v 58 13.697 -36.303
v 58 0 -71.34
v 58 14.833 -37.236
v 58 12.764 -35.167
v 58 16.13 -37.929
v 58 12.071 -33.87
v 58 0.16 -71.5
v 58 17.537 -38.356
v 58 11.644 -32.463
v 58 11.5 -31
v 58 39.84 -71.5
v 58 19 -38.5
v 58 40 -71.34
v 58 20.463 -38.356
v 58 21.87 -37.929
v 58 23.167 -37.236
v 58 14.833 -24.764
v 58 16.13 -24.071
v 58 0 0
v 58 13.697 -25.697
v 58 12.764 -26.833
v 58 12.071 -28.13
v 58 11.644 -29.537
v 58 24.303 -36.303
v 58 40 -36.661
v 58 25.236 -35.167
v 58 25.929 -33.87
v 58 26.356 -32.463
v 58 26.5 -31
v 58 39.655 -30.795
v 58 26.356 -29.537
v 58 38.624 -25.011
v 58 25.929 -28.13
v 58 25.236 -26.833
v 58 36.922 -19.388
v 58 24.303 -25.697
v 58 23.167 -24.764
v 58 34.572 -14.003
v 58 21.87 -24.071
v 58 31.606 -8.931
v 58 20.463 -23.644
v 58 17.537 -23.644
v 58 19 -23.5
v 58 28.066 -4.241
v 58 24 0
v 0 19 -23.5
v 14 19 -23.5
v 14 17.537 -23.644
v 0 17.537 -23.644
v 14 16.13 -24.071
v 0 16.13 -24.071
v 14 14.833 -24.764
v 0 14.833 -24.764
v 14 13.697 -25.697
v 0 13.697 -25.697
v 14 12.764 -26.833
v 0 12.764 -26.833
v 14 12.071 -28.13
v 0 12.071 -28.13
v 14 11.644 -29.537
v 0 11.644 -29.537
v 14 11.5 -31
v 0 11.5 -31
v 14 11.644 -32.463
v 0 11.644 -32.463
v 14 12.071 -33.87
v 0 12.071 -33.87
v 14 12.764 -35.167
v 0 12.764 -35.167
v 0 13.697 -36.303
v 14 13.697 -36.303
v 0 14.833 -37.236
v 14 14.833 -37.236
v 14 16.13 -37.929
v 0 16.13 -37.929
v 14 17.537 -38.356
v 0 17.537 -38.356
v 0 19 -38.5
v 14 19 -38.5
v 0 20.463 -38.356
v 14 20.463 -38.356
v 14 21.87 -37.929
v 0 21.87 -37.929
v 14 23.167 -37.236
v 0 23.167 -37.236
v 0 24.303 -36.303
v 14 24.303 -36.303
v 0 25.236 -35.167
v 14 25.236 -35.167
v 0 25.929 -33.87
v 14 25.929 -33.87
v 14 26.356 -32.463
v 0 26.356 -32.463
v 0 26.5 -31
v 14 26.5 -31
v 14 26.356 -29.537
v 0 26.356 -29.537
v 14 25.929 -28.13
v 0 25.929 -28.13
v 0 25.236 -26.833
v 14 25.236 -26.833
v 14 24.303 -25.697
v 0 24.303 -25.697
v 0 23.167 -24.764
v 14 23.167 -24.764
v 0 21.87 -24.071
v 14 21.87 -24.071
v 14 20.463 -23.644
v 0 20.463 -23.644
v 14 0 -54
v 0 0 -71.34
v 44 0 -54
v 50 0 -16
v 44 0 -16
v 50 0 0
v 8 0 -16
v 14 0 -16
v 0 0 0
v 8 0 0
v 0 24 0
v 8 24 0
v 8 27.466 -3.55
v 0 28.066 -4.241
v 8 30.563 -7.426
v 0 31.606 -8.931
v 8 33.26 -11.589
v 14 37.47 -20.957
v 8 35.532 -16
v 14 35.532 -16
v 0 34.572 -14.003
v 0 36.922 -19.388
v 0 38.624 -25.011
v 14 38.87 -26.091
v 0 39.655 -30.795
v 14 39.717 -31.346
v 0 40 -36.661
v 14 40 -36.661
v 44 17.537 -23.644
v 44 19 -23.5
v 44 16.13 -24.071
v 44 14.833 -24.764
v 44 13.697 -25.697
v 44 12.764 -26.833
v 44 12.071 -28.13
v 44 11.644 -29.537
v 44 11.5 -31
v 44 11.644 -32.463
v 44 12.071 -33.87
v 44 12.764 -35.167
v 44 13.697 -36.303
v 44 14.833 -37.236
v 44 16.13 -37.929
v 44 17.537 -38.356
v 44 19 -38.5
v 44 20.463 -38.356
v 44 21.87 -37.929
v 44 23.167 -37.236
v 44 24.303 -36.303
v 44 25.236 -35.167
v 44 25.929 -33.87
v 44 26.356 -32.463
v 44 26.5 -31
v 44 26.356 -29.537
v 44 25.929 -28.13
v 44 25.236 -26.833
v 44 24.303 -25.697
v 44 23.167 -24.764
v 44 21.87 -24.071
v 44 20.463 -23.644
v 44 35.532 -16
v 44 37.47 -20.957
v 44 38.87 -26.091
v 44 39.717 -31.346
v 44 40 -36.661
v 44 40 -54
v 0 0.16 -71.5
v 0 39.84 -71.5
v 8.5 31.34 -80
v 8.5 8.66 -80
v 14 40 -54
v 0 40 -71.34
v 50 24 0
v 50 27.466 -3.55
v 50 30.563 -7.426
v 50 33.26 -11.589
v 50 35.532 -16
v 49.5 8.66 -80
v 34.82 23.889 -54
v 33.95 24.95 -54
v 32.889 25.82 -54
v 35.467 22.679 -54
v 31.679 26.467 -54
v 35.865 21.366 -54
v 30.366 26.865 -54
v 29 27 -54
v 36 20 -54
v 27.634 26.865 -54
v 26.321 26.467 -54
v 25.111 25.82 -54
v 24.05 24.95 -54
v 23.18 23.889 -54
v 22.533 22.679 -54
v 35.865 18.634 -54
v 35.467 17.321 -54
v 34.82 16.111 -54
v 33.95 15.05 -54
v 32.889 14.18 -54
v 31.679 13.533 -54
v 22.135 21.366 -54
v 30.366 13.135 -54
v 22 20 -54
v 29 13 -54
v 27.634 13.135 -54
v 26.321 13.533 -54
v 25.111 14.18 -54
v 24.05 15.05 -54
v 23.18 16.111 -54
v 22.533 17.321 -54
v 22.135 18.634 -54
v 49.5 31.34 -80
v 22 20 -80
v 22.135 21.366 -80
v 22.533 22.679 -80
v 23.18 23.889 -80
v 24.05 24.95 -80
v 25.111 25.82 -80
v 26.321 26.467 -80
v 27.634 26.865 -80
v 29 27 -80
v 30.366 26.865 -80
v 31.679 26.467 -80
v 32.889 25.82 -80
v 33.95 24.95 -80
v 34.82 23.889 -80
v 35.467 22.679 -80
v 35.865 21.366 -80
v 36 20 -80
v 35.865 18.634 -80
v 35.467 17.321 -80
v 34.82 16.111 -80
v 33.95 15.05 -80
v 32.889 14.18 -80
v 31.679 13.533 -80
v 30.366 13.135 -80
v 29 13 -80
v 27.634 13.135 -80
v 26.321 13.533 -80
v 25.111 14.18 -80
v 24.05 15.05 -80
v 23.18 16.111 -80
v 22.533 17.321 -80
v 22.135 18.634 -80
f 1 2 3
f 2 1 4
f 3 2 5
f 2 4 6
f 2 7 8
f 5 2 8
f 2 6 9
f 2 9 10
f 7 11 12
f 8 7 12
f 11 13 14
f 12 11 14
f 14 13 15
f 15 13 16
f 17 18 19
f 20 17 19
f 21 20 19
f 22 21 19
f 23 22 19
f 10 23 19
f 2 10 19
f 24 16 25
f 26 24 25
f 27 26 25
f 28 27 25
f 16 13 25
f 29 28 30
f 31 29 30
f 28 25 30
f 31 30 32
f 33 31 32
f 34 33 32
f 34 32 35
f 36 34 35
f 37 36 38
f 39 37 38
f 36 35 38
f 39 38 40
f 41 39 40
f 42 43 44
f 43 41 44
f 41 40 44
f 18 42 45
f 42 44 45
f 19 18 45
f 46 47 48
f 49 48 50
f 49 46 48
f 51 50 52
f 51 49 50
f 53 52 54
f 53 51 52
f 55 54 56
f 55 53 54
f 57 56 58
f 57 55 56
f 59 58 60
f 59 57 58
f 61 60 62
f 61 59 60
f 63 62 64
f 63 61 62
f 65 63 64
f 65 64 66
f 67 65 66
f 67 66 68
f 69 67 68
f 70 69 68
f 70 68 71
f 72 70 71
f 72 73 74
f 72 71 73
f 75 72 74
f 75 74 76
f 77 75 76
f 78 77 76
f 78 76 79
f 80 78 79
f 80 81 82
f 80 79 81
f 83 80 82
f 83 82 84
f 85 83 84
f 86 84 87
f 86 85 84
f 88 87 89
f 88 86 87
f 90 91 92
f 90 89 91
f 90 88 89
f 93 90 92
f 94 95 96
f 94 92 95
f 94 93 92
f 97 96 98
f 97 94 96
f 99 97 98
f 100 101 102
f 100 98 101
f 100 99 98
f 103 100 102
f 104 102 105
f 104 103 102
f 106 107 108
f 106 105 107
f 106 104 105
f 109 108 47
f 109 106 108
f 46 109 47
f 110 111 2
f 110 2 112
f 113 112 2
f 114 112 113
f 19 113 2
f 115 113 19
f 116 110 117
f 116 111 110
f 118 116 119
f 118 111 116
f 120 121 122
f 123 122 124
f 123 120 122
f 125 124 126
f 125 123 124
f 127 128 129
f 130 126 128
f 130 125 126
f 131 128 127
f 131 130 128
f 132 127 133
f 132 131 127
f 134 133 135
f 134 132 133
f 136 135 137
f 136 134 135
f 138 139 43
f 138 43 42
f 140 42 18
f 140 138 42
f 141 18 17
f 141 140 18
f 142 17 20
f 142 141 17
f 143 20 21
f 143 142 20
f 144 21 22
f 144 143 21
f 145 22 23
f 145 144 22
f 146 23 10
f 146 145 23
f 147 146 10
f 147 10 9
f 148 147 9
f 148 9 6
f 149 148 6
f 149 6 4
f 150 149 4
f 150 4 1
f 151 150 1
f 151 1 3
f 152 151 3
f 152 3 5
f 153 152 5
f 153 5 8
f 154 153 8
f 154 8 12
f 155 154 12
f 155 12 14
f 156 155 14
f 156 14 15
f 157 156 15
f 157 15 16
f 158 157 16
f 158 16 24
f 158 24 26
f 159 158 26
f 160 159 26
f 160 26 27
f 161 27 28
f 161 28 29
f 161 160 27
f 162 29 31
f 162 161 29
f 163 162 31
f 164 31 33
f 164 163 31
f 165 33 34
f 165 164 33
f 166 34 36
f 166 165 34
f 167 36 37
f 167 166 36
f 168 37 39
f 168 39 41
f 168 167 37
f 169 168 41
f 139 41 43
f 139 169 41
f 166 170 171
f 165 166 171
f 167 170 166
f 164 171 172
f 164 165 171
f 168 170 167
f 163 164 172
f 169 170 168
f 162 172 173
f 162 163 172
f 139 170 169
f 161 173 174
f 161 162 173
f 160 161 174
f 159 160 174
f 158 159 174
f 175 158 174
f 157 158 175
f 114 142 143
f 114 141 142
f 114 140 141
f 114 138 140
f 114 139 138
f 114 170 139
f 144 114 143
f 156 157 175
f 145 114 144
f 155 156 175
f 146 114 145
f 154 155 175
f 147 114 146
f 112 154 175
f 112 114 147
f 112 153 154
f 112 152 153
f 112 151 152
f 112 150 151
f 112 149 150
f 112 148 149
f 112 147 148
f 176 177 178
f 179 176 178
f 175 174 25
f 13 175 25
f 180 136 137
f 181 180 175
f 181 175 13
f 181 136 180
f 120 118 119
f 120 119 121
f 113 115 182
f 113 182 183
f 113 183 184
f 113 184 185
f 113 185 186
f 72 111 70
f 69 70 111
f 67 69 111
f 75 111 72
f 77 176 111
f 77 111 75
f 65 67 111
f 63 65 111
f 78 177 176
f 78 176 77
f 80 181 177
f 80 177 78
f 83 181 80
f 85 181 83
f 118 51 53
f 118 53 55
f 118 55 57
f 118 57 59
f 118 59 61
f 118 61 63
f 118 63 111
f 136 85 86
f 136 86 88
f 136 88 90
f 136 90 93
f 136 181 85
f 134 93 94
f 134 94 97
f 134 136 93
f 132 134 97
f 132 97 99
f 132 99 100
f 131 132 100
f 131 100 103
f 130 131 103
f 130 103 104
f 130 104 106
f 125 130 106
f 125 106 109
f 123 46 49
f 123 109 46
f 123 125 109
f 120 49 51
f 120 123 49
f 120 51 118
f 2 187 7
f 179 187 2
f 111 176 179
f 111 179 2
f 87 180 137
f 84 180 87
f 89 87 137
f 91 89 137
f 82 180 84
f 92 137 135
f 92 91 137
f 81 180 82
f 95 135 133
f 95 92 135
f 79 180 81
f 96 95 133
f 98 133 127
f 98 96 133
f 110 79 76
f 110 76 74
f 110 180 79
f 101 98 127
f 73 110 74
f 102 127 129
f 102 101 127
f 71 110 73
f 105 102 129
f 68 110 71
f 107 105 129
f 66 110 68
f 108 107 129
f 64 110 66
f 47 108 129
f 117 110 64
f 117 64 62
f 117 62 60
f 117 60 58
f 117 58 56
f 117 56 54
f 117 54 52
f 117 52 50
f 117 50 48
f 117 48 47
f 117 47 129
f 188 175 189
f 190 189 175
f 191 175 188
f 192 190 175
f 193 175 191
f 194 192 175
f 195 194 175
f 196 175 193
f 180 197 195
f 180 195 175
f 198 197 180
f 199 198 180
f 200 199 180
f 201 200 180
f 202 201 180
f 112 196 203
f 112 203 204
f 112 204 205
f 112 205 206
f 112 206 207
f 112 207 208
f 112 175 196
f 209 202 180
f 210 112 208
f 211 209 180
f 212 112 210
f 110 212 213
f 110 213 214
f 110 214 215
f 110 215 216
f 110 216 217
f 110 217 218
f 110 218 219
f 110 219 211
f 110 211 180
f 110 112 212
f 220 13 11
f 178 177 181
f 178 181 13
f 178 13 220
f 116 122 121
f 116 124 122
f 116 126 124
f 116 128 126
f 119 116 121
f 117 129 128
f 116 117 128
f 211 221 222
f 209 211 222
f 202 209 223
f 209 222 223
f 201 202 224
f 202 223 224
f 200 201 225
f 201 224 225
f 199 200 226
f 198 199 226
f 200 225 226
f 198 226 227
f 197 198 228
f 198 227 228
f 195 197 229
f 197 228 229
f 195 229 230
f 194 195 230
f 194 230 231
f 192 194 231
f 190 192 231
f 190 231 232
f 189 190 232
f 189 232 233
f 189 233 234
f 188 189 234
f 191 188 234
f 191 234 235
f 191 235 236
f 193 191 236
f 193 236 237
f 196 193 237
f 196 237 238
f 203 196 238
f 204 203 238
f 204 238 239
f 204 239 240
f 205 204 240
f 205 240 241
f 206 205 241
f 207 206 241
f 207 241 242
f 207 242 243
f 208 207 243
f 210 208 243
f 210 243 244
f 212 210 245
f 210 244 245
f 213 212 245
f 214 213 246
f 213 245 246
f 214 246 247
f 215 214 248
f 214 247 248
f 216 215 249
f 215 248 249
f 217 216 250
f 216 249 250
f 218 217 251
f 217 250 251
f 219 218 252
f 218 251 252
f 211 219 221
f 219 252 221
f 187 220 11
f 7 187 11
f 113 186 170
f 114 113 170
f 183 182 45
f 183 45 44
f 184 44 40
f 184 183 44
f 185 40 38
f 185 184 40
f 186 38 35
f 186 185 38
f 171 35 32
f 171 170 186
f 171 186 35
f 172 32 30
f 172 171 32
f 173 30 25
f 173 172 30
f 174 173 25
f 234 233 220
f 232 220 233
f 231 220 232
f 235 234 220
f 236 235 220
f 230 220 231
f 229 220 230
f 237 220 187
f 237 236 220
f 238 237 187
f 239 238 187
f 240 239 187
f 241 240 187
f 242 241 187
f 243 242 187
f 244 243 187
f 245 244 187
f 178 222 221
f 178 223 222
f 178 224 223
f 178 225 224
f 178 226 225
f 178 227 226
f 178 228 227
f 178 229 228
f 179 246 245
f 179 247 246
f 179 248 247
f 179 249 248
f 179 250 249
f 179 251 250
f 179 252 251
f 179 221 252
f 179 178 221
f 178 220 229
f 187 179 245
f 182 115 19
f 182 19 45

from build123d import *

# Parameters (mm, degrees)
SKETCH2_R           = 7.5
BOSS_EXTRUDE1_DEPTH = 58
CUT_EXTRUDE1_DEPTH  = 107.60206377
DRAFT2_ANGLE        = 45
SKETCH6_R           = 7
CUT_EXTRUDE6_DEPTH  = 107.60206377
CHAMFER9_SIZE       = 8.5
CHAMFER10_SIZE      = 8.5


with BuildPart() as part:
    # Sketch2 → Boss-Extrude1 (new body)
    with BuildSketch(Plane(origin=(0, 0, 0), x_dir=(0, 0, -1), z_dir=(1, 0, 0))):
        with BuildLine():
            Line((0, 0), (0, 24))
            ThreePointArc((0, 24), (16.66060556, 35.82575695), (36.66060556, 40))
            Line((36.66060556, 40), (65, 40))
            Line((65, 40), (80, 31.339745962))
            Line((80, 31.339745962), (80, 8.660254038))
            Line((80, 8.660254038), (65, 0))
            Line((65, 0), (0, 0))
        make_face()
        with Locations((31, 19)):
            Circle(SKETCH2_R, mode=Mode.SUBTRACT)
    extrude(amount=BOSS_EXTRUDE1_DEPTH)

    # Sketch4 → Cut-Extrude1 (cut, through all)
    with BuildSketch(Plane.XZ):
        Polygon((8, 0), (50, 0), (50, -16), (44, -16), (44, -54), (14, -54), (14, -16), (8, -16), align=None)
    extrude(amount=-CUT_EXTRUDE1_DEPTH, mode=Mode.SUBTRACT)

    # Draft2
    draft2_faces = [part.faces().sort_by_distance(p)[0] for p in [
        (29, 4.330127019, -72.5),
        (29, 35.669872981, -72.5),
    ]]
    draft(draft2_faces, Plane(origin=(58, 8.660254038, -80), x_dir=(-1, 0, 0), z_dir=(0, 0, -1)), DRAFT2_ANGLE)

    # Sketch6 → Cut-Extrude6 (cut, through all)
    with BuildSketch(Plane(origin=(0, 0, -80), x_dir=(-1, 0, 0), z_dir=(0, 0, -1))):
        with Locations((-29, 20)):
            Circle(SKETCH6_R)
    extrude(amount=-CUT_EXTRUDE6_DEPTH, mode=Mode.SUBTRACT)

    # Chamfer9
    chamfer9_edges = [part.edges().sort_by_distance(p)[0] for p in [
        (58, 20, -80),
    ]]
    chamfer(chamfer9_edges, length=CHAMFER9_SIZE)

    # Chamfer10
    chamfer10_edges = [part.edges().sort_by_distance(p)[0] for p in [
        (0, 20, -80),
    ]]
    chamfer(chamfer10_edges, length=CHAMFER10_SIZE)


solid = part.part
